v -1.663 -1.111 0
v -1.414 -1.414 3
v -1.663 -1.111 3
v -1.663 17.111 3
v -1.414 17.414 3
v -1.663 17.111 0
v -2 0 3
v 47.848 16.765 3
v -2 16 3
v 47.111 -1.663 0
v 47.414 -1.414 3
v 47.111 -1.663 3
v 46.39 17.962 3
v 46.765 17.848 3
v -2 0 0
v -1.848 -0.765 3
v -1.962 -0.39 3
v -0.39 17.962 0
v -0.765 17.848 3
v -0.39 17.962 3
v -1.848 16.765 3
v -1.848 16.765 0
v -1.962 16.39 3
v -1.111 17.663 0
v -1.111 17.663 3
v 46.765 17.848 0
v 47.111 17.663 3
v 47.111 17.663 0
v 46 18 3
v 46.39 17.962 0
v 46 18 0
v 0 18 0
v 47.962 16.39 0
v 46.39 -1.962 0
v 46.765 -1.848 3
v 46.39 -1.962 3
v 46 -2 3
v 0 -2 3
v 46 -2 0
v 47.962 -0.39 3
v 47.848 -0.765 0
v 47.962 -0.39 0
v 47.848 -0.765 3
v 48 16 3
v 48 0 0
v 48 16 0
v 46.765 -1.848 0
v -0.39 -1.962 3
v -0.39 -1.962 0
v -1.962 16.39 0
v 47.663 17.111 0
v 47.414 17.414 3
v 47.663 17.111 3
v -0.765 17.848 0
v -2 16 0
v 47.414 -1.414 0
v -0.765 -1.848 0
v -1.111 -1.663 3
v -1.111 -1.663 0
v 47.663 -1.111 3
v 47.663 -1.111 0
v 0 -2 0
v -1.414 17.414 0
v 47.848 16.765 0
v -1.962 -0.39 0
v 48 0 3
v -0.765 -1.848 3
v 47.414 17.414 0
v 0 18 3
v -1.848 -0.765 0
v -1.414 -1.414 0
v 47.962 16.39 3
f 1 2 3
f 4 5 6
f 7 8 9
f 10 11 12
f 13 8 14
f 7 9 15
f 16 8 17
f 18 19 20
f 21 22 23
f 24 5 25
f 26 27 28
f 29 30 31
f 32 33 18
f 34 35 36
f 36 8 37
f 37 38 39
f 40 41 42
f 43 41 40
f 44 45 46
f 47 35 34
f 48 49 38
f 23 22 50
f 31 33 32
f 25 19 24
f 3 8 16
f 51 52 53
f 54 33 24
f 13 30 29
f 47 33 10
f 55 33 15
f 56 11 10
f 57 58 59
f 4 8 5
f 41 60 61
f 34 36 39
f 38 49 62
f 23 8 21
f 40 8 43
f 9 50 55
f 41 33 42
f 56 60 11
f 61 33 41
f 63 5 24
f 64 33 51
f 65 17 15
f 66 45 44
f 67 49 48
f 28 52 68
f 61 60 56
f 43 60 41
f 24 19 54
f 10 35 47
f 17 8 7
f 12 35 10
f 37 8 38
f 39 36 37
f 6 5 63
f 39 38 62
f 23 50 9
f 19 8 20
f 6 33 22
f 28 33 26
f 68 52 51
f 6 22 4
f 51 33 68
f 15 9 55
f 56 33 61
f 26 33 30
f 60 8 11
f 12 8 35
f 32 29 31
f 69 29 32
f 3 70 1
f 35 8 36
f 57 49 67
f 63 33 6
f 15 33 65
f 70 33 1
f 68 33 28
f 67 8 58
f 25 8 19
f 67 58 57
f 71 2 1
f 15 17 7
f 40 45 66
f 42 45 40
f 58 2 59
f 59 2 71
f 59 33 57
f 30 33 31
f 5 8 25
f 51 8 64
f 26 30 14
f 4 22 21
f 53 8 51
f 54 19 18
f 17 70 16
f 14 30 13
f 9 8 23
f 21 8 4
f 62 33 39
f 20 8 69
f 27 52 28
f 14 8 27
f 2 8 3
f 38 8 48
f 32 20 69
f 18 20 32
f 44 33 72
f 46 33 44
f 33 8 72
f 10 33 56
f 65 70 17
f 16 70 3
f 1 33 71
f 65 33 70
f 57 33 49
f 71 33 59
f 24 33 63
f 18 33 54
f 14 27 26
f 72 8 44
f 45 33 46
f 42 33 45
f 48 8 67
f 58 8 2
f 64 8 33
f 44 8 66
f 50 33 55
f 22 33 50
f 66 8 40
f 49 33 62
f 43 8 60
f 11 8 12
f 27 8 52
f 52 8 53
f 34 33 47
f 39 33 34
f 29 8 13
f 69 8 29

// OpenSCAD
/* [Main] */

width = 50; // [10:1:100] @unit:mm @label:"Width"
height = 20; // [5:1:50] @unit:mm @label:"Height"
rounded = true; // @label:"Rounded corners"

if (rounded) {
    minkowski() {
        cube([width - 4, height - 4, 2]);
        cylinder(r = 2, h = 1, $fn = 32);
    }
} else {
    cube([width, height, 3]);
}
